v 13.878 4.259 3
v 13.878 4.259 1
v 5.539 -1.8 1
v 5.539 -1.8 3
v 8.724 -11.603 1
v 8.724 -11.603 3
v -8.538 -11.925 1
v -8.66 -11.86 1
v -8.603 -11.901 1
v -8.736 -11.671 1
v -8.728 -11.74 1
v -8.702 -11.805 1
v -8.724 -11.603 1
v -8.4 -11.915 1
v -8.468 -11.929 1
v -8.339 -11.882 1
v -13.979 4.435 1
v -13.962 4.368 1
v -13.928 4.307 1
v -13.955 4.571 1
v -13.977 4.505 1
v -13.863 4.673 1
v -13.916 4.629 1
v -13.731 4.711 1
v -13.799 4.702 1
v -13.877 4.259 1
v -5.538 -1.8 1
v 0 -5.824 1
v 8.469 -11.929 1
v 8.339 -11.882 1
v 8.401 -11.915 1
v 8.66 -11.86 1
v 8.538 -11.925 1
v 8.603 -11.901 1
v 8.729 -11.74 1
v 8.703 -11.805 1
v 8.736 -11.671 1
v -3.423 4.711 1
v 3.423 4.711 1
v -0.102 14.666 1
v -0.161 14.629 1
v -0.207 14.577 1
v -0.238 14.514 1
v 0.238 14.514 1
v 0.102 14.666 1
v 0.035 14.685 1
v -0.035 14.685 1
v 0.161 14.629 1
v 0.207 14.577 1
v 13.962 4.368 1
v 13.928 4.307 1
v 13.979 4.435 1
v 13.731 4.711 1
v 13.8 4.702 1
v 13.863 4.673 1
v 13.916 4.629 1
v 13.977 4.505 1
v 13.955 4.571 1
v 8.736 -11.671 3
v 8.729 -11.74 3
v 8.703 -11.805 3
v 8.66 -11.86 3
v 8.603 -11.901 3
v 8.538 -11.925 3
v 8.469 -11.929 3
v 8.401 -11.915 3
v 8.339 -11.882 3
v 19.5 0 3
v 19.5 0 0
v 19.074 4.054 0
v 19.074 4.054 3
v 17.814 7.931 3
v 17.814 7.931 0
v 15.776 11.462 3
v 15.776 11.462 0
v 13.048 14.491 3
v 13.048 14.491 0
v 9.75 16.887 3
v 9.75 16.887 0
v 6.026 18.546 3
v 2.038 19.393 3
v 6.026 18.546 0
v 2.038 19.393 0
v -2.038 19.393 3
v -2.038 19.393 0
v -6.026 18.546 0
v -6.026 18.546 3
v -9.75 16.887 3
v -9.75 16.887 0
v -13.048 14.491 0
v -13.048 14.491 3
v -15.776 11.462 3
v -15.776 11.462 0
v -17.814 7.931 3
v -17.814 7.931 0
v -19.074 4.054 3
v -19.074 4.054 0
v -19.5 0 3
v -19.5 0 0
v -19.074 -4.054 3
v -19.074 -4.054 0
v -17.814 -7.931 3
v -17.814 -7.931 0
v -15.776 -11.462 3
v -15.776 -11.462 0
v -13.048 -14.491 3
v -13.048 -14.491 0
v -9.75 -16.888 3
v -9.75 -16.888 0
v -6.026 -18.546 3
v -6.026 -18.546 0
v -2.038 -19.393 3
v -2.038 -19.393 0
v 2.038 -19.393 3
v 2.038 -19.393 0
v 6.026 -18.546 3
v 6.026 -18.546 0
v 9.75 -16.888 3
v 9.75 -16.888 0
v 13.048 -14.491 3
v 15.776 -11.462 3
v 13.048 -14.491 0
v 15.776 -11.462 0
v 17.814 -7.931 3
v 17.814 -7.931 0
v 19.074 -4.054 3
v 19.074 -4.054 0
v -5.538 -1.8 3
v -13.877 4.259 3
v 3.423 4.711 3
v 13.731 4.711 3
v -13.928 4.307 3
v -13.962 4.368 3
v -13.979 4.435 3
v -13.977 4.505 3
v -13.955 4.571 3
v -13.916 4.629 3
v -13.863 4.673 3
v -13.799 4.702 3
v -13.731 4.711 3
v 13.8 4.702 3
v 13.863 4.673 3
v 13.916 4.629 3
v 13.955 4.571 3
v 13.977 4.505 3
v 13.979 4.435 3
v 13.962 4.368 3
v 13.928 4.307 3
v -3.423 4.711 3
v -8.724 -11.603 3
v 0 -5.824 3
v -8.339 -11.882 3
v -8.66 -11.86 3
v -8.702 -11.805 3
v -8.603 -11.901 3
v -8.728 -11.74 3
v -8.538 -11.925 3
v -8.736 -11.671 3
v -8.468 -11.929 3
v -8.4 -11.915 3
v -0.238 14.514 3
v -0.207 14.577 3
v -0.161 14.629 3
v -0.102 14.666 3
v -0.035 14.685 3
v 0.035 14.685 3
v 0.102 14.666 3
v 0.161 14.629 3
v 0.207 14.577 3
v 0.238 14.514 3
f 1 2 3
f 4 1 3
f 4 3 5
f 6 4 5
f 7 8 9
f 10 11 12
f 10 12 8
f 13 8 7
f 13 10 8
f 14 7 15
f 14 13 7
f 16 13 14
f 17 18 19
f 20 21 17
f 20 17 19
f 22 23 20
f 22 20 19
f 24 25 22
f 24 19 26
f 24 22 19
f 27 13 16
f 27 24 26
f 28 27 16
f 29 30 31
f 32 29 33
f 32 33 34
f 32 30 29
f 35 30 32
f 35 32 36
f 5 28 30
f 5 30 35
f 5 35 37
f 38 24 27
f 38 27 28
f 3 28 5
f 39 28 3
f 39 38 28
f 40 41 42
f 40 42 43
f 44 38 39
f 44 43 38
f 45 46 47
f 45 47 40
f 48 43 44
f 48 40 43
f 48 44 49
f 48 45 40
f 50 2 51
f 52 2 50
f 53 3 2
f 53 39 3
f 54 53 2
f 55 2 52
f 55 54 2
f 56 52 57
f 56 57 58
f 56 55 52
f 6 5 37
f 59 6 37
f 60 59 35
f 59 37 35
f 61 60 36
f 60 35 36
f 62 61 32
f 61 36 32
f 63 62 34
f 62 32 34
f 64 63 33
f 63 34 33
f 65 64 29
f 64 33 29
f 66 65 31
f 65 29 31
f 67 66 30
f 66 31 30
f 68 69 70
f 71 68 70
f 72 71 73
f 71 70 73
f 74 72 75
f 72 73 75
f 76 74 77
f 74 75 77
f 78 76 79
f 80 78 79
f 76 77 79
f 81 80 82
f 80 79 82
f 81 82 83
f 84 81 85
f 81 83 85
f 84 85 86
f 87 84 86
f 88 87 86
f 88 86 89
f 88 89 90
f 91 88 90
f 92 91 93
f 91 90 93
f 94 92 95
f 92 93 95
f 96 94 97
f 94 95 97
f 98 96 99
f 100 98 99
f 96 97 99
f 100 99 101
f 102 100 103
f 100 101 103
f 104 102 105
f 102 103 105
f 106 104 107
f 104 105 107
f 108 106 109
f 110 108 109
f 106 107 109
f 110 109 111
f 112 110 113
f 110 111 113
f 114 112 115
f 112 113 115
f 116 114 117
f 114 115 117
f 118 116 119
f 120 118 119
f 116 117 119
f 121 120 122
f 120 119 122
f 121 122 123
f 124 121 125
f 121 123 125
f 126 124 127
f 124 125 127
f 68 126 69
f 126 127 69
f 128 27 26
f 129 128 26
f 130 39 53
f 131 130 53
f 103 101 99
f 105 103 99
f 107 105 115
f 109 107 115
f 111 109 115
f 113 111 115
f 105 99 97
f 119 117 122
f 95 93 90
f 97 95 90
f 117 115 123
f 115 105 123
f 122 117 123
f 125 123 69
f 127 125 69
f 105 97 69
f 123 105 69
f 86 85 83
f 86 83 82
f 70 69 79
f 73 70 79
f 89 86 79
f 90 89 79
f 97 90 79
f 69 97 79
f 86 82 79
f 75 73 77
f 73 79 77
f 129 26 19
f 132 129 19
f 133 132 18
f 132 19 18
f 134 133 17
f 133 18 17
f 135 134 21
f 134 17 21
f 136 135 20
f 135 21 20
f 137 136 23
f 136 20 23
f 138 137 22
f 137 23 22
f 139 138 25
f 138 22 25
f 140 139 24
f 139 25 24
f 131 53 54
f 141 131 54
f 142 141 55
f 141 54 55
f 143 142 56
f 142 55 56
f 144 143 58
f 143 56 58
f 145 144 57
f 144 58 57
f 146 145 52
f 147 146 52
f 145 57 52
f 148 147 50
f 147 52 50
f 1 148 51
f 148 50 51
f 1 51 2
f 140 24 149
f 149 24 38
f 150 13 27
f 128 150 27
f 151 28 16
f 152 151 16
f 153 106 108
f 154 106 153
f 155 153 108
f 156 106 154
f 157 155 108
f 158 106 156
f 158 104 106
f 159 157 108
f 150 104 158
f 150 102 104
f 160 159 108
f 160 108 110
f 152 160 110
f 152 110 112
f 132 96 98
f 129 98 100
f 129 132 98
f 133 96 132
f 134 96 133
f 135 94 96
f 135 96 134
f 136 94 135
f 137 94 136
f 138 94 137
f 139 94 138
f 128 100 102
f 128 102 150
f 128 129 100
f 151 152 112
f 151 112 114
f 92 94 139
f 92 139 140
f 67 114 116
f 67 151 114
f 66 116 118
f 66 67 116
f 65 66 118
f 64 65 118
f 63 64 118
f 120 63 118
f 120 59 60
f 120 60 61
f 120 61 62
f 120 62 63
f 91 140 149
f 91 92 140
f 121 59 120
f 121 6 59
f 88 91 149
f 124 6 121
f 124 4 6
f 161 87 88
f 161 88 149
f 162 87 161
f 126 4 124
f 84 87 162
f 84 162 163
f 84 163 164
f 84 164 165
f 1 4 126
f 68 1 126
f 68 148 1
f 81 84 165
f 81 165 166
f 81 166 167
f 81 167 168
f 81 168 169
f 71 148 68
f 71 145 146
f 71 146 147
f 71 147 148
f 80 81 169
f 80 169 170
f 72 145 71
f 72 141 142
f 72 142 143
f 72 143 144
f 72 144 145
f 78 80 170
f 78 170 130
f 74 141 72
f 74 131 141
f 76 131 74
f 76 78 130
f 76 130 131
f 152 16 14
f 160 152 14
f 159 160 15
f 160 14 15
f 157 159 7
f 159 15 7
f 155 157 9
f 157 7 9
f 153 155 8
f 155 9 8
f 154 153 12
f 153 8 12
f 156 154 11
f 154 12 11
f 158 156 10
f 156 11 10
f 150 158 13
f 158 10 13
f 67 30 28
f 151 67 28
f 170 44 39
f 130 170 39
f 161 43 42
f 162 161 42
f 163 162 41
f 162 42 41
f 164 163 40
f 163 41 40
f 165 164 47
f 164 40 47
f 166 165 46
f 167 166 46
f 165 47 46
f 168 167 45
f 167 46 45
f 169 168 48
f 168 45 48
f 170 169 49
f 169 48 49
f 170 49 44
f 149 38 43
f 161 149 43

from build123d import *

# Parameters (mm, degrees)
F0_R     = 19.5
F1_DEPTH = 3
F2_DEPTH = 1


# Not quite as in the source:
# - a feature names something its author has since deleted; it is built from what else it names


with BuildPart() as f1:
    # F0 (on Top) → F1 (new body)
    with BuildSketch(Plane.XY):
        with Locations((6.52368e-05, -6.45803e-05)):
            Circle(F0_R)
        with BuildLine():
            ThreePointArc((-8.3389530288, -11.8822470528), (-8.632845655, -11.8822470528), (-8.723663471, -11.6027385556))
            Line((-8.723663471, -11.6027385556), (-5.5384419263, -1.7996346453))
            Line((-5.5384419263, -1.7996346453), (-13.877460192, 4.2590167665))
            ThreePointArc((-13.877460192, 4.2590167665), (-13.968278008, 4.5385252636), (-13.7305138789, 4.7112710151))
            Line((-13.7305138789, 4.7112710151), (-3.4229204369, 4.7112710151))
            Line((-3.4229204369, 4.7112710151), (-0.2376988922, 14.5143749254))
            ThreePointArc((-0.2376988922, 14.5143749254), (6.52368e-05, 14.6871206768), (0.2378293659, 14.5143749254))
            Line((0.2378293659, 14.5143749254), (3.4230509106, 4.7112710151))
            Line((3.4230509106, 4.7112710151), (13.7306443525, 4.7112710151))
            ThreePointArc((13.7306443525, 4.7112710151), (13.9684084816, 4.5385252637), (13.8775906656, 4.2590167665))
            Line((13.8775906656, 4.2590167665), (5.5385724, -1.7996346453))
            Line((5.5385724, -1.7996346453), (8.7237939446, -11.6027385556))
            ThreePointArc((8.7237939446, -11.6027385556), (8.6329761286, -11.8822470528), (8.3390835025, -11.8822470528))
            Line((8.3390835025, -11.8822470528), (6.52368e-05, -5.823595641))
            Line((6.52368e-05, -5.823595641), (-8.3389530288, -11.8822470528))
        make_face(mode=Mode.SUBTRACT)
    extrude(amount=F1_DEPTH)

    # F0 (on Top) → F2 (join)
    with BuildSketch(Plane.XY):
        with BuildLine():
            Line((-5.5384419263, -1.7996346453), (-8.723663471, -11.6027385556))
            ThreePointArc((-8.723663471, -11.6027385556), (-8.632845655, -11.8822470528), (-8.3389530288, -11.8822470528))
            Line((-8.3389530288, -11.8822470528), (6.52368e-05, -5.823595641))
            Line((6.52368e-05, -5.823595641), (-5.5384419263, -1.7996346453))
        make_face()
        with BuildLine():
            Line((-13.877460192, 4.2590167665), (-5.5384419263, -1.7996346453))
            Line((-5.5384419263, -1.7996346453), (-3.4229204369, 4.7112710151))
            Line((-3.4229204369, 4.7112710151), (-13.7305138789, 4.7112710151))
            ThreePointArc((-13.7305138789, 4.7112710151), (-13.968278008, 4.5385252636), (-13.877460192, 4.2590167665))
        make_face()
        Polygon((-3.4229204369, 4.7112710151), (-5.5384419263, -1.7996346453), (6.52368e-05, -5.823595641), (5.5385724, -1.7996346453), (3.4230509106, 4.7112710151), align=None)
        with BuildLine():
            Line((-0.2376988922, 14.5143749254), (-3.4229204369, 4.7112710151))
            Line((-3.4229204369, 4.7112710151), (3.4230509106, 4.7112710151))
            Line((3.4230509106, 4.7112710151), (0.2378293659, 14.5143749254))
            ThreePointArc((0.2378293659, 14.5143749254), (6.52368e-05, 14.6871206768), (-0.2376988922, 14.5143749254))
        make_face()
        with BuildLine():
            Line((5.5385724, -1.7996346453), (6.52368e-05, -5.823595641))
            Line((6.52368e-05, -5.823595641), (8.3390835025, -11.8822470528))
            ThreePointArc((8.3390835025, -11.8822470528), (8.6329761286, -11.8822470528), (8.7237939446, -11.6027385556))
            Line((8.7237939446, -11.6027385556), (5.5385724, -1.7996346453))
        make_face()
        with BuildLine():
            Line((13.7306443525, 4.7112710151), (3.4230509106, 4.7112710151))
            Line((3.4230509106, 4.7112710151), (5.5385724, -1.7996346453))
            Line((5.5385724, -1.7996346453), (13.8775906656, 4.2590167665))
            ThreePointArc((13.8775906656, 4.2590167665), (13.9684084816, 4.5385252637), (13.7306443525, 4.7112710151))
        make_face()
    extrude(amount=F2_DEPTH)


solid = f1.part
